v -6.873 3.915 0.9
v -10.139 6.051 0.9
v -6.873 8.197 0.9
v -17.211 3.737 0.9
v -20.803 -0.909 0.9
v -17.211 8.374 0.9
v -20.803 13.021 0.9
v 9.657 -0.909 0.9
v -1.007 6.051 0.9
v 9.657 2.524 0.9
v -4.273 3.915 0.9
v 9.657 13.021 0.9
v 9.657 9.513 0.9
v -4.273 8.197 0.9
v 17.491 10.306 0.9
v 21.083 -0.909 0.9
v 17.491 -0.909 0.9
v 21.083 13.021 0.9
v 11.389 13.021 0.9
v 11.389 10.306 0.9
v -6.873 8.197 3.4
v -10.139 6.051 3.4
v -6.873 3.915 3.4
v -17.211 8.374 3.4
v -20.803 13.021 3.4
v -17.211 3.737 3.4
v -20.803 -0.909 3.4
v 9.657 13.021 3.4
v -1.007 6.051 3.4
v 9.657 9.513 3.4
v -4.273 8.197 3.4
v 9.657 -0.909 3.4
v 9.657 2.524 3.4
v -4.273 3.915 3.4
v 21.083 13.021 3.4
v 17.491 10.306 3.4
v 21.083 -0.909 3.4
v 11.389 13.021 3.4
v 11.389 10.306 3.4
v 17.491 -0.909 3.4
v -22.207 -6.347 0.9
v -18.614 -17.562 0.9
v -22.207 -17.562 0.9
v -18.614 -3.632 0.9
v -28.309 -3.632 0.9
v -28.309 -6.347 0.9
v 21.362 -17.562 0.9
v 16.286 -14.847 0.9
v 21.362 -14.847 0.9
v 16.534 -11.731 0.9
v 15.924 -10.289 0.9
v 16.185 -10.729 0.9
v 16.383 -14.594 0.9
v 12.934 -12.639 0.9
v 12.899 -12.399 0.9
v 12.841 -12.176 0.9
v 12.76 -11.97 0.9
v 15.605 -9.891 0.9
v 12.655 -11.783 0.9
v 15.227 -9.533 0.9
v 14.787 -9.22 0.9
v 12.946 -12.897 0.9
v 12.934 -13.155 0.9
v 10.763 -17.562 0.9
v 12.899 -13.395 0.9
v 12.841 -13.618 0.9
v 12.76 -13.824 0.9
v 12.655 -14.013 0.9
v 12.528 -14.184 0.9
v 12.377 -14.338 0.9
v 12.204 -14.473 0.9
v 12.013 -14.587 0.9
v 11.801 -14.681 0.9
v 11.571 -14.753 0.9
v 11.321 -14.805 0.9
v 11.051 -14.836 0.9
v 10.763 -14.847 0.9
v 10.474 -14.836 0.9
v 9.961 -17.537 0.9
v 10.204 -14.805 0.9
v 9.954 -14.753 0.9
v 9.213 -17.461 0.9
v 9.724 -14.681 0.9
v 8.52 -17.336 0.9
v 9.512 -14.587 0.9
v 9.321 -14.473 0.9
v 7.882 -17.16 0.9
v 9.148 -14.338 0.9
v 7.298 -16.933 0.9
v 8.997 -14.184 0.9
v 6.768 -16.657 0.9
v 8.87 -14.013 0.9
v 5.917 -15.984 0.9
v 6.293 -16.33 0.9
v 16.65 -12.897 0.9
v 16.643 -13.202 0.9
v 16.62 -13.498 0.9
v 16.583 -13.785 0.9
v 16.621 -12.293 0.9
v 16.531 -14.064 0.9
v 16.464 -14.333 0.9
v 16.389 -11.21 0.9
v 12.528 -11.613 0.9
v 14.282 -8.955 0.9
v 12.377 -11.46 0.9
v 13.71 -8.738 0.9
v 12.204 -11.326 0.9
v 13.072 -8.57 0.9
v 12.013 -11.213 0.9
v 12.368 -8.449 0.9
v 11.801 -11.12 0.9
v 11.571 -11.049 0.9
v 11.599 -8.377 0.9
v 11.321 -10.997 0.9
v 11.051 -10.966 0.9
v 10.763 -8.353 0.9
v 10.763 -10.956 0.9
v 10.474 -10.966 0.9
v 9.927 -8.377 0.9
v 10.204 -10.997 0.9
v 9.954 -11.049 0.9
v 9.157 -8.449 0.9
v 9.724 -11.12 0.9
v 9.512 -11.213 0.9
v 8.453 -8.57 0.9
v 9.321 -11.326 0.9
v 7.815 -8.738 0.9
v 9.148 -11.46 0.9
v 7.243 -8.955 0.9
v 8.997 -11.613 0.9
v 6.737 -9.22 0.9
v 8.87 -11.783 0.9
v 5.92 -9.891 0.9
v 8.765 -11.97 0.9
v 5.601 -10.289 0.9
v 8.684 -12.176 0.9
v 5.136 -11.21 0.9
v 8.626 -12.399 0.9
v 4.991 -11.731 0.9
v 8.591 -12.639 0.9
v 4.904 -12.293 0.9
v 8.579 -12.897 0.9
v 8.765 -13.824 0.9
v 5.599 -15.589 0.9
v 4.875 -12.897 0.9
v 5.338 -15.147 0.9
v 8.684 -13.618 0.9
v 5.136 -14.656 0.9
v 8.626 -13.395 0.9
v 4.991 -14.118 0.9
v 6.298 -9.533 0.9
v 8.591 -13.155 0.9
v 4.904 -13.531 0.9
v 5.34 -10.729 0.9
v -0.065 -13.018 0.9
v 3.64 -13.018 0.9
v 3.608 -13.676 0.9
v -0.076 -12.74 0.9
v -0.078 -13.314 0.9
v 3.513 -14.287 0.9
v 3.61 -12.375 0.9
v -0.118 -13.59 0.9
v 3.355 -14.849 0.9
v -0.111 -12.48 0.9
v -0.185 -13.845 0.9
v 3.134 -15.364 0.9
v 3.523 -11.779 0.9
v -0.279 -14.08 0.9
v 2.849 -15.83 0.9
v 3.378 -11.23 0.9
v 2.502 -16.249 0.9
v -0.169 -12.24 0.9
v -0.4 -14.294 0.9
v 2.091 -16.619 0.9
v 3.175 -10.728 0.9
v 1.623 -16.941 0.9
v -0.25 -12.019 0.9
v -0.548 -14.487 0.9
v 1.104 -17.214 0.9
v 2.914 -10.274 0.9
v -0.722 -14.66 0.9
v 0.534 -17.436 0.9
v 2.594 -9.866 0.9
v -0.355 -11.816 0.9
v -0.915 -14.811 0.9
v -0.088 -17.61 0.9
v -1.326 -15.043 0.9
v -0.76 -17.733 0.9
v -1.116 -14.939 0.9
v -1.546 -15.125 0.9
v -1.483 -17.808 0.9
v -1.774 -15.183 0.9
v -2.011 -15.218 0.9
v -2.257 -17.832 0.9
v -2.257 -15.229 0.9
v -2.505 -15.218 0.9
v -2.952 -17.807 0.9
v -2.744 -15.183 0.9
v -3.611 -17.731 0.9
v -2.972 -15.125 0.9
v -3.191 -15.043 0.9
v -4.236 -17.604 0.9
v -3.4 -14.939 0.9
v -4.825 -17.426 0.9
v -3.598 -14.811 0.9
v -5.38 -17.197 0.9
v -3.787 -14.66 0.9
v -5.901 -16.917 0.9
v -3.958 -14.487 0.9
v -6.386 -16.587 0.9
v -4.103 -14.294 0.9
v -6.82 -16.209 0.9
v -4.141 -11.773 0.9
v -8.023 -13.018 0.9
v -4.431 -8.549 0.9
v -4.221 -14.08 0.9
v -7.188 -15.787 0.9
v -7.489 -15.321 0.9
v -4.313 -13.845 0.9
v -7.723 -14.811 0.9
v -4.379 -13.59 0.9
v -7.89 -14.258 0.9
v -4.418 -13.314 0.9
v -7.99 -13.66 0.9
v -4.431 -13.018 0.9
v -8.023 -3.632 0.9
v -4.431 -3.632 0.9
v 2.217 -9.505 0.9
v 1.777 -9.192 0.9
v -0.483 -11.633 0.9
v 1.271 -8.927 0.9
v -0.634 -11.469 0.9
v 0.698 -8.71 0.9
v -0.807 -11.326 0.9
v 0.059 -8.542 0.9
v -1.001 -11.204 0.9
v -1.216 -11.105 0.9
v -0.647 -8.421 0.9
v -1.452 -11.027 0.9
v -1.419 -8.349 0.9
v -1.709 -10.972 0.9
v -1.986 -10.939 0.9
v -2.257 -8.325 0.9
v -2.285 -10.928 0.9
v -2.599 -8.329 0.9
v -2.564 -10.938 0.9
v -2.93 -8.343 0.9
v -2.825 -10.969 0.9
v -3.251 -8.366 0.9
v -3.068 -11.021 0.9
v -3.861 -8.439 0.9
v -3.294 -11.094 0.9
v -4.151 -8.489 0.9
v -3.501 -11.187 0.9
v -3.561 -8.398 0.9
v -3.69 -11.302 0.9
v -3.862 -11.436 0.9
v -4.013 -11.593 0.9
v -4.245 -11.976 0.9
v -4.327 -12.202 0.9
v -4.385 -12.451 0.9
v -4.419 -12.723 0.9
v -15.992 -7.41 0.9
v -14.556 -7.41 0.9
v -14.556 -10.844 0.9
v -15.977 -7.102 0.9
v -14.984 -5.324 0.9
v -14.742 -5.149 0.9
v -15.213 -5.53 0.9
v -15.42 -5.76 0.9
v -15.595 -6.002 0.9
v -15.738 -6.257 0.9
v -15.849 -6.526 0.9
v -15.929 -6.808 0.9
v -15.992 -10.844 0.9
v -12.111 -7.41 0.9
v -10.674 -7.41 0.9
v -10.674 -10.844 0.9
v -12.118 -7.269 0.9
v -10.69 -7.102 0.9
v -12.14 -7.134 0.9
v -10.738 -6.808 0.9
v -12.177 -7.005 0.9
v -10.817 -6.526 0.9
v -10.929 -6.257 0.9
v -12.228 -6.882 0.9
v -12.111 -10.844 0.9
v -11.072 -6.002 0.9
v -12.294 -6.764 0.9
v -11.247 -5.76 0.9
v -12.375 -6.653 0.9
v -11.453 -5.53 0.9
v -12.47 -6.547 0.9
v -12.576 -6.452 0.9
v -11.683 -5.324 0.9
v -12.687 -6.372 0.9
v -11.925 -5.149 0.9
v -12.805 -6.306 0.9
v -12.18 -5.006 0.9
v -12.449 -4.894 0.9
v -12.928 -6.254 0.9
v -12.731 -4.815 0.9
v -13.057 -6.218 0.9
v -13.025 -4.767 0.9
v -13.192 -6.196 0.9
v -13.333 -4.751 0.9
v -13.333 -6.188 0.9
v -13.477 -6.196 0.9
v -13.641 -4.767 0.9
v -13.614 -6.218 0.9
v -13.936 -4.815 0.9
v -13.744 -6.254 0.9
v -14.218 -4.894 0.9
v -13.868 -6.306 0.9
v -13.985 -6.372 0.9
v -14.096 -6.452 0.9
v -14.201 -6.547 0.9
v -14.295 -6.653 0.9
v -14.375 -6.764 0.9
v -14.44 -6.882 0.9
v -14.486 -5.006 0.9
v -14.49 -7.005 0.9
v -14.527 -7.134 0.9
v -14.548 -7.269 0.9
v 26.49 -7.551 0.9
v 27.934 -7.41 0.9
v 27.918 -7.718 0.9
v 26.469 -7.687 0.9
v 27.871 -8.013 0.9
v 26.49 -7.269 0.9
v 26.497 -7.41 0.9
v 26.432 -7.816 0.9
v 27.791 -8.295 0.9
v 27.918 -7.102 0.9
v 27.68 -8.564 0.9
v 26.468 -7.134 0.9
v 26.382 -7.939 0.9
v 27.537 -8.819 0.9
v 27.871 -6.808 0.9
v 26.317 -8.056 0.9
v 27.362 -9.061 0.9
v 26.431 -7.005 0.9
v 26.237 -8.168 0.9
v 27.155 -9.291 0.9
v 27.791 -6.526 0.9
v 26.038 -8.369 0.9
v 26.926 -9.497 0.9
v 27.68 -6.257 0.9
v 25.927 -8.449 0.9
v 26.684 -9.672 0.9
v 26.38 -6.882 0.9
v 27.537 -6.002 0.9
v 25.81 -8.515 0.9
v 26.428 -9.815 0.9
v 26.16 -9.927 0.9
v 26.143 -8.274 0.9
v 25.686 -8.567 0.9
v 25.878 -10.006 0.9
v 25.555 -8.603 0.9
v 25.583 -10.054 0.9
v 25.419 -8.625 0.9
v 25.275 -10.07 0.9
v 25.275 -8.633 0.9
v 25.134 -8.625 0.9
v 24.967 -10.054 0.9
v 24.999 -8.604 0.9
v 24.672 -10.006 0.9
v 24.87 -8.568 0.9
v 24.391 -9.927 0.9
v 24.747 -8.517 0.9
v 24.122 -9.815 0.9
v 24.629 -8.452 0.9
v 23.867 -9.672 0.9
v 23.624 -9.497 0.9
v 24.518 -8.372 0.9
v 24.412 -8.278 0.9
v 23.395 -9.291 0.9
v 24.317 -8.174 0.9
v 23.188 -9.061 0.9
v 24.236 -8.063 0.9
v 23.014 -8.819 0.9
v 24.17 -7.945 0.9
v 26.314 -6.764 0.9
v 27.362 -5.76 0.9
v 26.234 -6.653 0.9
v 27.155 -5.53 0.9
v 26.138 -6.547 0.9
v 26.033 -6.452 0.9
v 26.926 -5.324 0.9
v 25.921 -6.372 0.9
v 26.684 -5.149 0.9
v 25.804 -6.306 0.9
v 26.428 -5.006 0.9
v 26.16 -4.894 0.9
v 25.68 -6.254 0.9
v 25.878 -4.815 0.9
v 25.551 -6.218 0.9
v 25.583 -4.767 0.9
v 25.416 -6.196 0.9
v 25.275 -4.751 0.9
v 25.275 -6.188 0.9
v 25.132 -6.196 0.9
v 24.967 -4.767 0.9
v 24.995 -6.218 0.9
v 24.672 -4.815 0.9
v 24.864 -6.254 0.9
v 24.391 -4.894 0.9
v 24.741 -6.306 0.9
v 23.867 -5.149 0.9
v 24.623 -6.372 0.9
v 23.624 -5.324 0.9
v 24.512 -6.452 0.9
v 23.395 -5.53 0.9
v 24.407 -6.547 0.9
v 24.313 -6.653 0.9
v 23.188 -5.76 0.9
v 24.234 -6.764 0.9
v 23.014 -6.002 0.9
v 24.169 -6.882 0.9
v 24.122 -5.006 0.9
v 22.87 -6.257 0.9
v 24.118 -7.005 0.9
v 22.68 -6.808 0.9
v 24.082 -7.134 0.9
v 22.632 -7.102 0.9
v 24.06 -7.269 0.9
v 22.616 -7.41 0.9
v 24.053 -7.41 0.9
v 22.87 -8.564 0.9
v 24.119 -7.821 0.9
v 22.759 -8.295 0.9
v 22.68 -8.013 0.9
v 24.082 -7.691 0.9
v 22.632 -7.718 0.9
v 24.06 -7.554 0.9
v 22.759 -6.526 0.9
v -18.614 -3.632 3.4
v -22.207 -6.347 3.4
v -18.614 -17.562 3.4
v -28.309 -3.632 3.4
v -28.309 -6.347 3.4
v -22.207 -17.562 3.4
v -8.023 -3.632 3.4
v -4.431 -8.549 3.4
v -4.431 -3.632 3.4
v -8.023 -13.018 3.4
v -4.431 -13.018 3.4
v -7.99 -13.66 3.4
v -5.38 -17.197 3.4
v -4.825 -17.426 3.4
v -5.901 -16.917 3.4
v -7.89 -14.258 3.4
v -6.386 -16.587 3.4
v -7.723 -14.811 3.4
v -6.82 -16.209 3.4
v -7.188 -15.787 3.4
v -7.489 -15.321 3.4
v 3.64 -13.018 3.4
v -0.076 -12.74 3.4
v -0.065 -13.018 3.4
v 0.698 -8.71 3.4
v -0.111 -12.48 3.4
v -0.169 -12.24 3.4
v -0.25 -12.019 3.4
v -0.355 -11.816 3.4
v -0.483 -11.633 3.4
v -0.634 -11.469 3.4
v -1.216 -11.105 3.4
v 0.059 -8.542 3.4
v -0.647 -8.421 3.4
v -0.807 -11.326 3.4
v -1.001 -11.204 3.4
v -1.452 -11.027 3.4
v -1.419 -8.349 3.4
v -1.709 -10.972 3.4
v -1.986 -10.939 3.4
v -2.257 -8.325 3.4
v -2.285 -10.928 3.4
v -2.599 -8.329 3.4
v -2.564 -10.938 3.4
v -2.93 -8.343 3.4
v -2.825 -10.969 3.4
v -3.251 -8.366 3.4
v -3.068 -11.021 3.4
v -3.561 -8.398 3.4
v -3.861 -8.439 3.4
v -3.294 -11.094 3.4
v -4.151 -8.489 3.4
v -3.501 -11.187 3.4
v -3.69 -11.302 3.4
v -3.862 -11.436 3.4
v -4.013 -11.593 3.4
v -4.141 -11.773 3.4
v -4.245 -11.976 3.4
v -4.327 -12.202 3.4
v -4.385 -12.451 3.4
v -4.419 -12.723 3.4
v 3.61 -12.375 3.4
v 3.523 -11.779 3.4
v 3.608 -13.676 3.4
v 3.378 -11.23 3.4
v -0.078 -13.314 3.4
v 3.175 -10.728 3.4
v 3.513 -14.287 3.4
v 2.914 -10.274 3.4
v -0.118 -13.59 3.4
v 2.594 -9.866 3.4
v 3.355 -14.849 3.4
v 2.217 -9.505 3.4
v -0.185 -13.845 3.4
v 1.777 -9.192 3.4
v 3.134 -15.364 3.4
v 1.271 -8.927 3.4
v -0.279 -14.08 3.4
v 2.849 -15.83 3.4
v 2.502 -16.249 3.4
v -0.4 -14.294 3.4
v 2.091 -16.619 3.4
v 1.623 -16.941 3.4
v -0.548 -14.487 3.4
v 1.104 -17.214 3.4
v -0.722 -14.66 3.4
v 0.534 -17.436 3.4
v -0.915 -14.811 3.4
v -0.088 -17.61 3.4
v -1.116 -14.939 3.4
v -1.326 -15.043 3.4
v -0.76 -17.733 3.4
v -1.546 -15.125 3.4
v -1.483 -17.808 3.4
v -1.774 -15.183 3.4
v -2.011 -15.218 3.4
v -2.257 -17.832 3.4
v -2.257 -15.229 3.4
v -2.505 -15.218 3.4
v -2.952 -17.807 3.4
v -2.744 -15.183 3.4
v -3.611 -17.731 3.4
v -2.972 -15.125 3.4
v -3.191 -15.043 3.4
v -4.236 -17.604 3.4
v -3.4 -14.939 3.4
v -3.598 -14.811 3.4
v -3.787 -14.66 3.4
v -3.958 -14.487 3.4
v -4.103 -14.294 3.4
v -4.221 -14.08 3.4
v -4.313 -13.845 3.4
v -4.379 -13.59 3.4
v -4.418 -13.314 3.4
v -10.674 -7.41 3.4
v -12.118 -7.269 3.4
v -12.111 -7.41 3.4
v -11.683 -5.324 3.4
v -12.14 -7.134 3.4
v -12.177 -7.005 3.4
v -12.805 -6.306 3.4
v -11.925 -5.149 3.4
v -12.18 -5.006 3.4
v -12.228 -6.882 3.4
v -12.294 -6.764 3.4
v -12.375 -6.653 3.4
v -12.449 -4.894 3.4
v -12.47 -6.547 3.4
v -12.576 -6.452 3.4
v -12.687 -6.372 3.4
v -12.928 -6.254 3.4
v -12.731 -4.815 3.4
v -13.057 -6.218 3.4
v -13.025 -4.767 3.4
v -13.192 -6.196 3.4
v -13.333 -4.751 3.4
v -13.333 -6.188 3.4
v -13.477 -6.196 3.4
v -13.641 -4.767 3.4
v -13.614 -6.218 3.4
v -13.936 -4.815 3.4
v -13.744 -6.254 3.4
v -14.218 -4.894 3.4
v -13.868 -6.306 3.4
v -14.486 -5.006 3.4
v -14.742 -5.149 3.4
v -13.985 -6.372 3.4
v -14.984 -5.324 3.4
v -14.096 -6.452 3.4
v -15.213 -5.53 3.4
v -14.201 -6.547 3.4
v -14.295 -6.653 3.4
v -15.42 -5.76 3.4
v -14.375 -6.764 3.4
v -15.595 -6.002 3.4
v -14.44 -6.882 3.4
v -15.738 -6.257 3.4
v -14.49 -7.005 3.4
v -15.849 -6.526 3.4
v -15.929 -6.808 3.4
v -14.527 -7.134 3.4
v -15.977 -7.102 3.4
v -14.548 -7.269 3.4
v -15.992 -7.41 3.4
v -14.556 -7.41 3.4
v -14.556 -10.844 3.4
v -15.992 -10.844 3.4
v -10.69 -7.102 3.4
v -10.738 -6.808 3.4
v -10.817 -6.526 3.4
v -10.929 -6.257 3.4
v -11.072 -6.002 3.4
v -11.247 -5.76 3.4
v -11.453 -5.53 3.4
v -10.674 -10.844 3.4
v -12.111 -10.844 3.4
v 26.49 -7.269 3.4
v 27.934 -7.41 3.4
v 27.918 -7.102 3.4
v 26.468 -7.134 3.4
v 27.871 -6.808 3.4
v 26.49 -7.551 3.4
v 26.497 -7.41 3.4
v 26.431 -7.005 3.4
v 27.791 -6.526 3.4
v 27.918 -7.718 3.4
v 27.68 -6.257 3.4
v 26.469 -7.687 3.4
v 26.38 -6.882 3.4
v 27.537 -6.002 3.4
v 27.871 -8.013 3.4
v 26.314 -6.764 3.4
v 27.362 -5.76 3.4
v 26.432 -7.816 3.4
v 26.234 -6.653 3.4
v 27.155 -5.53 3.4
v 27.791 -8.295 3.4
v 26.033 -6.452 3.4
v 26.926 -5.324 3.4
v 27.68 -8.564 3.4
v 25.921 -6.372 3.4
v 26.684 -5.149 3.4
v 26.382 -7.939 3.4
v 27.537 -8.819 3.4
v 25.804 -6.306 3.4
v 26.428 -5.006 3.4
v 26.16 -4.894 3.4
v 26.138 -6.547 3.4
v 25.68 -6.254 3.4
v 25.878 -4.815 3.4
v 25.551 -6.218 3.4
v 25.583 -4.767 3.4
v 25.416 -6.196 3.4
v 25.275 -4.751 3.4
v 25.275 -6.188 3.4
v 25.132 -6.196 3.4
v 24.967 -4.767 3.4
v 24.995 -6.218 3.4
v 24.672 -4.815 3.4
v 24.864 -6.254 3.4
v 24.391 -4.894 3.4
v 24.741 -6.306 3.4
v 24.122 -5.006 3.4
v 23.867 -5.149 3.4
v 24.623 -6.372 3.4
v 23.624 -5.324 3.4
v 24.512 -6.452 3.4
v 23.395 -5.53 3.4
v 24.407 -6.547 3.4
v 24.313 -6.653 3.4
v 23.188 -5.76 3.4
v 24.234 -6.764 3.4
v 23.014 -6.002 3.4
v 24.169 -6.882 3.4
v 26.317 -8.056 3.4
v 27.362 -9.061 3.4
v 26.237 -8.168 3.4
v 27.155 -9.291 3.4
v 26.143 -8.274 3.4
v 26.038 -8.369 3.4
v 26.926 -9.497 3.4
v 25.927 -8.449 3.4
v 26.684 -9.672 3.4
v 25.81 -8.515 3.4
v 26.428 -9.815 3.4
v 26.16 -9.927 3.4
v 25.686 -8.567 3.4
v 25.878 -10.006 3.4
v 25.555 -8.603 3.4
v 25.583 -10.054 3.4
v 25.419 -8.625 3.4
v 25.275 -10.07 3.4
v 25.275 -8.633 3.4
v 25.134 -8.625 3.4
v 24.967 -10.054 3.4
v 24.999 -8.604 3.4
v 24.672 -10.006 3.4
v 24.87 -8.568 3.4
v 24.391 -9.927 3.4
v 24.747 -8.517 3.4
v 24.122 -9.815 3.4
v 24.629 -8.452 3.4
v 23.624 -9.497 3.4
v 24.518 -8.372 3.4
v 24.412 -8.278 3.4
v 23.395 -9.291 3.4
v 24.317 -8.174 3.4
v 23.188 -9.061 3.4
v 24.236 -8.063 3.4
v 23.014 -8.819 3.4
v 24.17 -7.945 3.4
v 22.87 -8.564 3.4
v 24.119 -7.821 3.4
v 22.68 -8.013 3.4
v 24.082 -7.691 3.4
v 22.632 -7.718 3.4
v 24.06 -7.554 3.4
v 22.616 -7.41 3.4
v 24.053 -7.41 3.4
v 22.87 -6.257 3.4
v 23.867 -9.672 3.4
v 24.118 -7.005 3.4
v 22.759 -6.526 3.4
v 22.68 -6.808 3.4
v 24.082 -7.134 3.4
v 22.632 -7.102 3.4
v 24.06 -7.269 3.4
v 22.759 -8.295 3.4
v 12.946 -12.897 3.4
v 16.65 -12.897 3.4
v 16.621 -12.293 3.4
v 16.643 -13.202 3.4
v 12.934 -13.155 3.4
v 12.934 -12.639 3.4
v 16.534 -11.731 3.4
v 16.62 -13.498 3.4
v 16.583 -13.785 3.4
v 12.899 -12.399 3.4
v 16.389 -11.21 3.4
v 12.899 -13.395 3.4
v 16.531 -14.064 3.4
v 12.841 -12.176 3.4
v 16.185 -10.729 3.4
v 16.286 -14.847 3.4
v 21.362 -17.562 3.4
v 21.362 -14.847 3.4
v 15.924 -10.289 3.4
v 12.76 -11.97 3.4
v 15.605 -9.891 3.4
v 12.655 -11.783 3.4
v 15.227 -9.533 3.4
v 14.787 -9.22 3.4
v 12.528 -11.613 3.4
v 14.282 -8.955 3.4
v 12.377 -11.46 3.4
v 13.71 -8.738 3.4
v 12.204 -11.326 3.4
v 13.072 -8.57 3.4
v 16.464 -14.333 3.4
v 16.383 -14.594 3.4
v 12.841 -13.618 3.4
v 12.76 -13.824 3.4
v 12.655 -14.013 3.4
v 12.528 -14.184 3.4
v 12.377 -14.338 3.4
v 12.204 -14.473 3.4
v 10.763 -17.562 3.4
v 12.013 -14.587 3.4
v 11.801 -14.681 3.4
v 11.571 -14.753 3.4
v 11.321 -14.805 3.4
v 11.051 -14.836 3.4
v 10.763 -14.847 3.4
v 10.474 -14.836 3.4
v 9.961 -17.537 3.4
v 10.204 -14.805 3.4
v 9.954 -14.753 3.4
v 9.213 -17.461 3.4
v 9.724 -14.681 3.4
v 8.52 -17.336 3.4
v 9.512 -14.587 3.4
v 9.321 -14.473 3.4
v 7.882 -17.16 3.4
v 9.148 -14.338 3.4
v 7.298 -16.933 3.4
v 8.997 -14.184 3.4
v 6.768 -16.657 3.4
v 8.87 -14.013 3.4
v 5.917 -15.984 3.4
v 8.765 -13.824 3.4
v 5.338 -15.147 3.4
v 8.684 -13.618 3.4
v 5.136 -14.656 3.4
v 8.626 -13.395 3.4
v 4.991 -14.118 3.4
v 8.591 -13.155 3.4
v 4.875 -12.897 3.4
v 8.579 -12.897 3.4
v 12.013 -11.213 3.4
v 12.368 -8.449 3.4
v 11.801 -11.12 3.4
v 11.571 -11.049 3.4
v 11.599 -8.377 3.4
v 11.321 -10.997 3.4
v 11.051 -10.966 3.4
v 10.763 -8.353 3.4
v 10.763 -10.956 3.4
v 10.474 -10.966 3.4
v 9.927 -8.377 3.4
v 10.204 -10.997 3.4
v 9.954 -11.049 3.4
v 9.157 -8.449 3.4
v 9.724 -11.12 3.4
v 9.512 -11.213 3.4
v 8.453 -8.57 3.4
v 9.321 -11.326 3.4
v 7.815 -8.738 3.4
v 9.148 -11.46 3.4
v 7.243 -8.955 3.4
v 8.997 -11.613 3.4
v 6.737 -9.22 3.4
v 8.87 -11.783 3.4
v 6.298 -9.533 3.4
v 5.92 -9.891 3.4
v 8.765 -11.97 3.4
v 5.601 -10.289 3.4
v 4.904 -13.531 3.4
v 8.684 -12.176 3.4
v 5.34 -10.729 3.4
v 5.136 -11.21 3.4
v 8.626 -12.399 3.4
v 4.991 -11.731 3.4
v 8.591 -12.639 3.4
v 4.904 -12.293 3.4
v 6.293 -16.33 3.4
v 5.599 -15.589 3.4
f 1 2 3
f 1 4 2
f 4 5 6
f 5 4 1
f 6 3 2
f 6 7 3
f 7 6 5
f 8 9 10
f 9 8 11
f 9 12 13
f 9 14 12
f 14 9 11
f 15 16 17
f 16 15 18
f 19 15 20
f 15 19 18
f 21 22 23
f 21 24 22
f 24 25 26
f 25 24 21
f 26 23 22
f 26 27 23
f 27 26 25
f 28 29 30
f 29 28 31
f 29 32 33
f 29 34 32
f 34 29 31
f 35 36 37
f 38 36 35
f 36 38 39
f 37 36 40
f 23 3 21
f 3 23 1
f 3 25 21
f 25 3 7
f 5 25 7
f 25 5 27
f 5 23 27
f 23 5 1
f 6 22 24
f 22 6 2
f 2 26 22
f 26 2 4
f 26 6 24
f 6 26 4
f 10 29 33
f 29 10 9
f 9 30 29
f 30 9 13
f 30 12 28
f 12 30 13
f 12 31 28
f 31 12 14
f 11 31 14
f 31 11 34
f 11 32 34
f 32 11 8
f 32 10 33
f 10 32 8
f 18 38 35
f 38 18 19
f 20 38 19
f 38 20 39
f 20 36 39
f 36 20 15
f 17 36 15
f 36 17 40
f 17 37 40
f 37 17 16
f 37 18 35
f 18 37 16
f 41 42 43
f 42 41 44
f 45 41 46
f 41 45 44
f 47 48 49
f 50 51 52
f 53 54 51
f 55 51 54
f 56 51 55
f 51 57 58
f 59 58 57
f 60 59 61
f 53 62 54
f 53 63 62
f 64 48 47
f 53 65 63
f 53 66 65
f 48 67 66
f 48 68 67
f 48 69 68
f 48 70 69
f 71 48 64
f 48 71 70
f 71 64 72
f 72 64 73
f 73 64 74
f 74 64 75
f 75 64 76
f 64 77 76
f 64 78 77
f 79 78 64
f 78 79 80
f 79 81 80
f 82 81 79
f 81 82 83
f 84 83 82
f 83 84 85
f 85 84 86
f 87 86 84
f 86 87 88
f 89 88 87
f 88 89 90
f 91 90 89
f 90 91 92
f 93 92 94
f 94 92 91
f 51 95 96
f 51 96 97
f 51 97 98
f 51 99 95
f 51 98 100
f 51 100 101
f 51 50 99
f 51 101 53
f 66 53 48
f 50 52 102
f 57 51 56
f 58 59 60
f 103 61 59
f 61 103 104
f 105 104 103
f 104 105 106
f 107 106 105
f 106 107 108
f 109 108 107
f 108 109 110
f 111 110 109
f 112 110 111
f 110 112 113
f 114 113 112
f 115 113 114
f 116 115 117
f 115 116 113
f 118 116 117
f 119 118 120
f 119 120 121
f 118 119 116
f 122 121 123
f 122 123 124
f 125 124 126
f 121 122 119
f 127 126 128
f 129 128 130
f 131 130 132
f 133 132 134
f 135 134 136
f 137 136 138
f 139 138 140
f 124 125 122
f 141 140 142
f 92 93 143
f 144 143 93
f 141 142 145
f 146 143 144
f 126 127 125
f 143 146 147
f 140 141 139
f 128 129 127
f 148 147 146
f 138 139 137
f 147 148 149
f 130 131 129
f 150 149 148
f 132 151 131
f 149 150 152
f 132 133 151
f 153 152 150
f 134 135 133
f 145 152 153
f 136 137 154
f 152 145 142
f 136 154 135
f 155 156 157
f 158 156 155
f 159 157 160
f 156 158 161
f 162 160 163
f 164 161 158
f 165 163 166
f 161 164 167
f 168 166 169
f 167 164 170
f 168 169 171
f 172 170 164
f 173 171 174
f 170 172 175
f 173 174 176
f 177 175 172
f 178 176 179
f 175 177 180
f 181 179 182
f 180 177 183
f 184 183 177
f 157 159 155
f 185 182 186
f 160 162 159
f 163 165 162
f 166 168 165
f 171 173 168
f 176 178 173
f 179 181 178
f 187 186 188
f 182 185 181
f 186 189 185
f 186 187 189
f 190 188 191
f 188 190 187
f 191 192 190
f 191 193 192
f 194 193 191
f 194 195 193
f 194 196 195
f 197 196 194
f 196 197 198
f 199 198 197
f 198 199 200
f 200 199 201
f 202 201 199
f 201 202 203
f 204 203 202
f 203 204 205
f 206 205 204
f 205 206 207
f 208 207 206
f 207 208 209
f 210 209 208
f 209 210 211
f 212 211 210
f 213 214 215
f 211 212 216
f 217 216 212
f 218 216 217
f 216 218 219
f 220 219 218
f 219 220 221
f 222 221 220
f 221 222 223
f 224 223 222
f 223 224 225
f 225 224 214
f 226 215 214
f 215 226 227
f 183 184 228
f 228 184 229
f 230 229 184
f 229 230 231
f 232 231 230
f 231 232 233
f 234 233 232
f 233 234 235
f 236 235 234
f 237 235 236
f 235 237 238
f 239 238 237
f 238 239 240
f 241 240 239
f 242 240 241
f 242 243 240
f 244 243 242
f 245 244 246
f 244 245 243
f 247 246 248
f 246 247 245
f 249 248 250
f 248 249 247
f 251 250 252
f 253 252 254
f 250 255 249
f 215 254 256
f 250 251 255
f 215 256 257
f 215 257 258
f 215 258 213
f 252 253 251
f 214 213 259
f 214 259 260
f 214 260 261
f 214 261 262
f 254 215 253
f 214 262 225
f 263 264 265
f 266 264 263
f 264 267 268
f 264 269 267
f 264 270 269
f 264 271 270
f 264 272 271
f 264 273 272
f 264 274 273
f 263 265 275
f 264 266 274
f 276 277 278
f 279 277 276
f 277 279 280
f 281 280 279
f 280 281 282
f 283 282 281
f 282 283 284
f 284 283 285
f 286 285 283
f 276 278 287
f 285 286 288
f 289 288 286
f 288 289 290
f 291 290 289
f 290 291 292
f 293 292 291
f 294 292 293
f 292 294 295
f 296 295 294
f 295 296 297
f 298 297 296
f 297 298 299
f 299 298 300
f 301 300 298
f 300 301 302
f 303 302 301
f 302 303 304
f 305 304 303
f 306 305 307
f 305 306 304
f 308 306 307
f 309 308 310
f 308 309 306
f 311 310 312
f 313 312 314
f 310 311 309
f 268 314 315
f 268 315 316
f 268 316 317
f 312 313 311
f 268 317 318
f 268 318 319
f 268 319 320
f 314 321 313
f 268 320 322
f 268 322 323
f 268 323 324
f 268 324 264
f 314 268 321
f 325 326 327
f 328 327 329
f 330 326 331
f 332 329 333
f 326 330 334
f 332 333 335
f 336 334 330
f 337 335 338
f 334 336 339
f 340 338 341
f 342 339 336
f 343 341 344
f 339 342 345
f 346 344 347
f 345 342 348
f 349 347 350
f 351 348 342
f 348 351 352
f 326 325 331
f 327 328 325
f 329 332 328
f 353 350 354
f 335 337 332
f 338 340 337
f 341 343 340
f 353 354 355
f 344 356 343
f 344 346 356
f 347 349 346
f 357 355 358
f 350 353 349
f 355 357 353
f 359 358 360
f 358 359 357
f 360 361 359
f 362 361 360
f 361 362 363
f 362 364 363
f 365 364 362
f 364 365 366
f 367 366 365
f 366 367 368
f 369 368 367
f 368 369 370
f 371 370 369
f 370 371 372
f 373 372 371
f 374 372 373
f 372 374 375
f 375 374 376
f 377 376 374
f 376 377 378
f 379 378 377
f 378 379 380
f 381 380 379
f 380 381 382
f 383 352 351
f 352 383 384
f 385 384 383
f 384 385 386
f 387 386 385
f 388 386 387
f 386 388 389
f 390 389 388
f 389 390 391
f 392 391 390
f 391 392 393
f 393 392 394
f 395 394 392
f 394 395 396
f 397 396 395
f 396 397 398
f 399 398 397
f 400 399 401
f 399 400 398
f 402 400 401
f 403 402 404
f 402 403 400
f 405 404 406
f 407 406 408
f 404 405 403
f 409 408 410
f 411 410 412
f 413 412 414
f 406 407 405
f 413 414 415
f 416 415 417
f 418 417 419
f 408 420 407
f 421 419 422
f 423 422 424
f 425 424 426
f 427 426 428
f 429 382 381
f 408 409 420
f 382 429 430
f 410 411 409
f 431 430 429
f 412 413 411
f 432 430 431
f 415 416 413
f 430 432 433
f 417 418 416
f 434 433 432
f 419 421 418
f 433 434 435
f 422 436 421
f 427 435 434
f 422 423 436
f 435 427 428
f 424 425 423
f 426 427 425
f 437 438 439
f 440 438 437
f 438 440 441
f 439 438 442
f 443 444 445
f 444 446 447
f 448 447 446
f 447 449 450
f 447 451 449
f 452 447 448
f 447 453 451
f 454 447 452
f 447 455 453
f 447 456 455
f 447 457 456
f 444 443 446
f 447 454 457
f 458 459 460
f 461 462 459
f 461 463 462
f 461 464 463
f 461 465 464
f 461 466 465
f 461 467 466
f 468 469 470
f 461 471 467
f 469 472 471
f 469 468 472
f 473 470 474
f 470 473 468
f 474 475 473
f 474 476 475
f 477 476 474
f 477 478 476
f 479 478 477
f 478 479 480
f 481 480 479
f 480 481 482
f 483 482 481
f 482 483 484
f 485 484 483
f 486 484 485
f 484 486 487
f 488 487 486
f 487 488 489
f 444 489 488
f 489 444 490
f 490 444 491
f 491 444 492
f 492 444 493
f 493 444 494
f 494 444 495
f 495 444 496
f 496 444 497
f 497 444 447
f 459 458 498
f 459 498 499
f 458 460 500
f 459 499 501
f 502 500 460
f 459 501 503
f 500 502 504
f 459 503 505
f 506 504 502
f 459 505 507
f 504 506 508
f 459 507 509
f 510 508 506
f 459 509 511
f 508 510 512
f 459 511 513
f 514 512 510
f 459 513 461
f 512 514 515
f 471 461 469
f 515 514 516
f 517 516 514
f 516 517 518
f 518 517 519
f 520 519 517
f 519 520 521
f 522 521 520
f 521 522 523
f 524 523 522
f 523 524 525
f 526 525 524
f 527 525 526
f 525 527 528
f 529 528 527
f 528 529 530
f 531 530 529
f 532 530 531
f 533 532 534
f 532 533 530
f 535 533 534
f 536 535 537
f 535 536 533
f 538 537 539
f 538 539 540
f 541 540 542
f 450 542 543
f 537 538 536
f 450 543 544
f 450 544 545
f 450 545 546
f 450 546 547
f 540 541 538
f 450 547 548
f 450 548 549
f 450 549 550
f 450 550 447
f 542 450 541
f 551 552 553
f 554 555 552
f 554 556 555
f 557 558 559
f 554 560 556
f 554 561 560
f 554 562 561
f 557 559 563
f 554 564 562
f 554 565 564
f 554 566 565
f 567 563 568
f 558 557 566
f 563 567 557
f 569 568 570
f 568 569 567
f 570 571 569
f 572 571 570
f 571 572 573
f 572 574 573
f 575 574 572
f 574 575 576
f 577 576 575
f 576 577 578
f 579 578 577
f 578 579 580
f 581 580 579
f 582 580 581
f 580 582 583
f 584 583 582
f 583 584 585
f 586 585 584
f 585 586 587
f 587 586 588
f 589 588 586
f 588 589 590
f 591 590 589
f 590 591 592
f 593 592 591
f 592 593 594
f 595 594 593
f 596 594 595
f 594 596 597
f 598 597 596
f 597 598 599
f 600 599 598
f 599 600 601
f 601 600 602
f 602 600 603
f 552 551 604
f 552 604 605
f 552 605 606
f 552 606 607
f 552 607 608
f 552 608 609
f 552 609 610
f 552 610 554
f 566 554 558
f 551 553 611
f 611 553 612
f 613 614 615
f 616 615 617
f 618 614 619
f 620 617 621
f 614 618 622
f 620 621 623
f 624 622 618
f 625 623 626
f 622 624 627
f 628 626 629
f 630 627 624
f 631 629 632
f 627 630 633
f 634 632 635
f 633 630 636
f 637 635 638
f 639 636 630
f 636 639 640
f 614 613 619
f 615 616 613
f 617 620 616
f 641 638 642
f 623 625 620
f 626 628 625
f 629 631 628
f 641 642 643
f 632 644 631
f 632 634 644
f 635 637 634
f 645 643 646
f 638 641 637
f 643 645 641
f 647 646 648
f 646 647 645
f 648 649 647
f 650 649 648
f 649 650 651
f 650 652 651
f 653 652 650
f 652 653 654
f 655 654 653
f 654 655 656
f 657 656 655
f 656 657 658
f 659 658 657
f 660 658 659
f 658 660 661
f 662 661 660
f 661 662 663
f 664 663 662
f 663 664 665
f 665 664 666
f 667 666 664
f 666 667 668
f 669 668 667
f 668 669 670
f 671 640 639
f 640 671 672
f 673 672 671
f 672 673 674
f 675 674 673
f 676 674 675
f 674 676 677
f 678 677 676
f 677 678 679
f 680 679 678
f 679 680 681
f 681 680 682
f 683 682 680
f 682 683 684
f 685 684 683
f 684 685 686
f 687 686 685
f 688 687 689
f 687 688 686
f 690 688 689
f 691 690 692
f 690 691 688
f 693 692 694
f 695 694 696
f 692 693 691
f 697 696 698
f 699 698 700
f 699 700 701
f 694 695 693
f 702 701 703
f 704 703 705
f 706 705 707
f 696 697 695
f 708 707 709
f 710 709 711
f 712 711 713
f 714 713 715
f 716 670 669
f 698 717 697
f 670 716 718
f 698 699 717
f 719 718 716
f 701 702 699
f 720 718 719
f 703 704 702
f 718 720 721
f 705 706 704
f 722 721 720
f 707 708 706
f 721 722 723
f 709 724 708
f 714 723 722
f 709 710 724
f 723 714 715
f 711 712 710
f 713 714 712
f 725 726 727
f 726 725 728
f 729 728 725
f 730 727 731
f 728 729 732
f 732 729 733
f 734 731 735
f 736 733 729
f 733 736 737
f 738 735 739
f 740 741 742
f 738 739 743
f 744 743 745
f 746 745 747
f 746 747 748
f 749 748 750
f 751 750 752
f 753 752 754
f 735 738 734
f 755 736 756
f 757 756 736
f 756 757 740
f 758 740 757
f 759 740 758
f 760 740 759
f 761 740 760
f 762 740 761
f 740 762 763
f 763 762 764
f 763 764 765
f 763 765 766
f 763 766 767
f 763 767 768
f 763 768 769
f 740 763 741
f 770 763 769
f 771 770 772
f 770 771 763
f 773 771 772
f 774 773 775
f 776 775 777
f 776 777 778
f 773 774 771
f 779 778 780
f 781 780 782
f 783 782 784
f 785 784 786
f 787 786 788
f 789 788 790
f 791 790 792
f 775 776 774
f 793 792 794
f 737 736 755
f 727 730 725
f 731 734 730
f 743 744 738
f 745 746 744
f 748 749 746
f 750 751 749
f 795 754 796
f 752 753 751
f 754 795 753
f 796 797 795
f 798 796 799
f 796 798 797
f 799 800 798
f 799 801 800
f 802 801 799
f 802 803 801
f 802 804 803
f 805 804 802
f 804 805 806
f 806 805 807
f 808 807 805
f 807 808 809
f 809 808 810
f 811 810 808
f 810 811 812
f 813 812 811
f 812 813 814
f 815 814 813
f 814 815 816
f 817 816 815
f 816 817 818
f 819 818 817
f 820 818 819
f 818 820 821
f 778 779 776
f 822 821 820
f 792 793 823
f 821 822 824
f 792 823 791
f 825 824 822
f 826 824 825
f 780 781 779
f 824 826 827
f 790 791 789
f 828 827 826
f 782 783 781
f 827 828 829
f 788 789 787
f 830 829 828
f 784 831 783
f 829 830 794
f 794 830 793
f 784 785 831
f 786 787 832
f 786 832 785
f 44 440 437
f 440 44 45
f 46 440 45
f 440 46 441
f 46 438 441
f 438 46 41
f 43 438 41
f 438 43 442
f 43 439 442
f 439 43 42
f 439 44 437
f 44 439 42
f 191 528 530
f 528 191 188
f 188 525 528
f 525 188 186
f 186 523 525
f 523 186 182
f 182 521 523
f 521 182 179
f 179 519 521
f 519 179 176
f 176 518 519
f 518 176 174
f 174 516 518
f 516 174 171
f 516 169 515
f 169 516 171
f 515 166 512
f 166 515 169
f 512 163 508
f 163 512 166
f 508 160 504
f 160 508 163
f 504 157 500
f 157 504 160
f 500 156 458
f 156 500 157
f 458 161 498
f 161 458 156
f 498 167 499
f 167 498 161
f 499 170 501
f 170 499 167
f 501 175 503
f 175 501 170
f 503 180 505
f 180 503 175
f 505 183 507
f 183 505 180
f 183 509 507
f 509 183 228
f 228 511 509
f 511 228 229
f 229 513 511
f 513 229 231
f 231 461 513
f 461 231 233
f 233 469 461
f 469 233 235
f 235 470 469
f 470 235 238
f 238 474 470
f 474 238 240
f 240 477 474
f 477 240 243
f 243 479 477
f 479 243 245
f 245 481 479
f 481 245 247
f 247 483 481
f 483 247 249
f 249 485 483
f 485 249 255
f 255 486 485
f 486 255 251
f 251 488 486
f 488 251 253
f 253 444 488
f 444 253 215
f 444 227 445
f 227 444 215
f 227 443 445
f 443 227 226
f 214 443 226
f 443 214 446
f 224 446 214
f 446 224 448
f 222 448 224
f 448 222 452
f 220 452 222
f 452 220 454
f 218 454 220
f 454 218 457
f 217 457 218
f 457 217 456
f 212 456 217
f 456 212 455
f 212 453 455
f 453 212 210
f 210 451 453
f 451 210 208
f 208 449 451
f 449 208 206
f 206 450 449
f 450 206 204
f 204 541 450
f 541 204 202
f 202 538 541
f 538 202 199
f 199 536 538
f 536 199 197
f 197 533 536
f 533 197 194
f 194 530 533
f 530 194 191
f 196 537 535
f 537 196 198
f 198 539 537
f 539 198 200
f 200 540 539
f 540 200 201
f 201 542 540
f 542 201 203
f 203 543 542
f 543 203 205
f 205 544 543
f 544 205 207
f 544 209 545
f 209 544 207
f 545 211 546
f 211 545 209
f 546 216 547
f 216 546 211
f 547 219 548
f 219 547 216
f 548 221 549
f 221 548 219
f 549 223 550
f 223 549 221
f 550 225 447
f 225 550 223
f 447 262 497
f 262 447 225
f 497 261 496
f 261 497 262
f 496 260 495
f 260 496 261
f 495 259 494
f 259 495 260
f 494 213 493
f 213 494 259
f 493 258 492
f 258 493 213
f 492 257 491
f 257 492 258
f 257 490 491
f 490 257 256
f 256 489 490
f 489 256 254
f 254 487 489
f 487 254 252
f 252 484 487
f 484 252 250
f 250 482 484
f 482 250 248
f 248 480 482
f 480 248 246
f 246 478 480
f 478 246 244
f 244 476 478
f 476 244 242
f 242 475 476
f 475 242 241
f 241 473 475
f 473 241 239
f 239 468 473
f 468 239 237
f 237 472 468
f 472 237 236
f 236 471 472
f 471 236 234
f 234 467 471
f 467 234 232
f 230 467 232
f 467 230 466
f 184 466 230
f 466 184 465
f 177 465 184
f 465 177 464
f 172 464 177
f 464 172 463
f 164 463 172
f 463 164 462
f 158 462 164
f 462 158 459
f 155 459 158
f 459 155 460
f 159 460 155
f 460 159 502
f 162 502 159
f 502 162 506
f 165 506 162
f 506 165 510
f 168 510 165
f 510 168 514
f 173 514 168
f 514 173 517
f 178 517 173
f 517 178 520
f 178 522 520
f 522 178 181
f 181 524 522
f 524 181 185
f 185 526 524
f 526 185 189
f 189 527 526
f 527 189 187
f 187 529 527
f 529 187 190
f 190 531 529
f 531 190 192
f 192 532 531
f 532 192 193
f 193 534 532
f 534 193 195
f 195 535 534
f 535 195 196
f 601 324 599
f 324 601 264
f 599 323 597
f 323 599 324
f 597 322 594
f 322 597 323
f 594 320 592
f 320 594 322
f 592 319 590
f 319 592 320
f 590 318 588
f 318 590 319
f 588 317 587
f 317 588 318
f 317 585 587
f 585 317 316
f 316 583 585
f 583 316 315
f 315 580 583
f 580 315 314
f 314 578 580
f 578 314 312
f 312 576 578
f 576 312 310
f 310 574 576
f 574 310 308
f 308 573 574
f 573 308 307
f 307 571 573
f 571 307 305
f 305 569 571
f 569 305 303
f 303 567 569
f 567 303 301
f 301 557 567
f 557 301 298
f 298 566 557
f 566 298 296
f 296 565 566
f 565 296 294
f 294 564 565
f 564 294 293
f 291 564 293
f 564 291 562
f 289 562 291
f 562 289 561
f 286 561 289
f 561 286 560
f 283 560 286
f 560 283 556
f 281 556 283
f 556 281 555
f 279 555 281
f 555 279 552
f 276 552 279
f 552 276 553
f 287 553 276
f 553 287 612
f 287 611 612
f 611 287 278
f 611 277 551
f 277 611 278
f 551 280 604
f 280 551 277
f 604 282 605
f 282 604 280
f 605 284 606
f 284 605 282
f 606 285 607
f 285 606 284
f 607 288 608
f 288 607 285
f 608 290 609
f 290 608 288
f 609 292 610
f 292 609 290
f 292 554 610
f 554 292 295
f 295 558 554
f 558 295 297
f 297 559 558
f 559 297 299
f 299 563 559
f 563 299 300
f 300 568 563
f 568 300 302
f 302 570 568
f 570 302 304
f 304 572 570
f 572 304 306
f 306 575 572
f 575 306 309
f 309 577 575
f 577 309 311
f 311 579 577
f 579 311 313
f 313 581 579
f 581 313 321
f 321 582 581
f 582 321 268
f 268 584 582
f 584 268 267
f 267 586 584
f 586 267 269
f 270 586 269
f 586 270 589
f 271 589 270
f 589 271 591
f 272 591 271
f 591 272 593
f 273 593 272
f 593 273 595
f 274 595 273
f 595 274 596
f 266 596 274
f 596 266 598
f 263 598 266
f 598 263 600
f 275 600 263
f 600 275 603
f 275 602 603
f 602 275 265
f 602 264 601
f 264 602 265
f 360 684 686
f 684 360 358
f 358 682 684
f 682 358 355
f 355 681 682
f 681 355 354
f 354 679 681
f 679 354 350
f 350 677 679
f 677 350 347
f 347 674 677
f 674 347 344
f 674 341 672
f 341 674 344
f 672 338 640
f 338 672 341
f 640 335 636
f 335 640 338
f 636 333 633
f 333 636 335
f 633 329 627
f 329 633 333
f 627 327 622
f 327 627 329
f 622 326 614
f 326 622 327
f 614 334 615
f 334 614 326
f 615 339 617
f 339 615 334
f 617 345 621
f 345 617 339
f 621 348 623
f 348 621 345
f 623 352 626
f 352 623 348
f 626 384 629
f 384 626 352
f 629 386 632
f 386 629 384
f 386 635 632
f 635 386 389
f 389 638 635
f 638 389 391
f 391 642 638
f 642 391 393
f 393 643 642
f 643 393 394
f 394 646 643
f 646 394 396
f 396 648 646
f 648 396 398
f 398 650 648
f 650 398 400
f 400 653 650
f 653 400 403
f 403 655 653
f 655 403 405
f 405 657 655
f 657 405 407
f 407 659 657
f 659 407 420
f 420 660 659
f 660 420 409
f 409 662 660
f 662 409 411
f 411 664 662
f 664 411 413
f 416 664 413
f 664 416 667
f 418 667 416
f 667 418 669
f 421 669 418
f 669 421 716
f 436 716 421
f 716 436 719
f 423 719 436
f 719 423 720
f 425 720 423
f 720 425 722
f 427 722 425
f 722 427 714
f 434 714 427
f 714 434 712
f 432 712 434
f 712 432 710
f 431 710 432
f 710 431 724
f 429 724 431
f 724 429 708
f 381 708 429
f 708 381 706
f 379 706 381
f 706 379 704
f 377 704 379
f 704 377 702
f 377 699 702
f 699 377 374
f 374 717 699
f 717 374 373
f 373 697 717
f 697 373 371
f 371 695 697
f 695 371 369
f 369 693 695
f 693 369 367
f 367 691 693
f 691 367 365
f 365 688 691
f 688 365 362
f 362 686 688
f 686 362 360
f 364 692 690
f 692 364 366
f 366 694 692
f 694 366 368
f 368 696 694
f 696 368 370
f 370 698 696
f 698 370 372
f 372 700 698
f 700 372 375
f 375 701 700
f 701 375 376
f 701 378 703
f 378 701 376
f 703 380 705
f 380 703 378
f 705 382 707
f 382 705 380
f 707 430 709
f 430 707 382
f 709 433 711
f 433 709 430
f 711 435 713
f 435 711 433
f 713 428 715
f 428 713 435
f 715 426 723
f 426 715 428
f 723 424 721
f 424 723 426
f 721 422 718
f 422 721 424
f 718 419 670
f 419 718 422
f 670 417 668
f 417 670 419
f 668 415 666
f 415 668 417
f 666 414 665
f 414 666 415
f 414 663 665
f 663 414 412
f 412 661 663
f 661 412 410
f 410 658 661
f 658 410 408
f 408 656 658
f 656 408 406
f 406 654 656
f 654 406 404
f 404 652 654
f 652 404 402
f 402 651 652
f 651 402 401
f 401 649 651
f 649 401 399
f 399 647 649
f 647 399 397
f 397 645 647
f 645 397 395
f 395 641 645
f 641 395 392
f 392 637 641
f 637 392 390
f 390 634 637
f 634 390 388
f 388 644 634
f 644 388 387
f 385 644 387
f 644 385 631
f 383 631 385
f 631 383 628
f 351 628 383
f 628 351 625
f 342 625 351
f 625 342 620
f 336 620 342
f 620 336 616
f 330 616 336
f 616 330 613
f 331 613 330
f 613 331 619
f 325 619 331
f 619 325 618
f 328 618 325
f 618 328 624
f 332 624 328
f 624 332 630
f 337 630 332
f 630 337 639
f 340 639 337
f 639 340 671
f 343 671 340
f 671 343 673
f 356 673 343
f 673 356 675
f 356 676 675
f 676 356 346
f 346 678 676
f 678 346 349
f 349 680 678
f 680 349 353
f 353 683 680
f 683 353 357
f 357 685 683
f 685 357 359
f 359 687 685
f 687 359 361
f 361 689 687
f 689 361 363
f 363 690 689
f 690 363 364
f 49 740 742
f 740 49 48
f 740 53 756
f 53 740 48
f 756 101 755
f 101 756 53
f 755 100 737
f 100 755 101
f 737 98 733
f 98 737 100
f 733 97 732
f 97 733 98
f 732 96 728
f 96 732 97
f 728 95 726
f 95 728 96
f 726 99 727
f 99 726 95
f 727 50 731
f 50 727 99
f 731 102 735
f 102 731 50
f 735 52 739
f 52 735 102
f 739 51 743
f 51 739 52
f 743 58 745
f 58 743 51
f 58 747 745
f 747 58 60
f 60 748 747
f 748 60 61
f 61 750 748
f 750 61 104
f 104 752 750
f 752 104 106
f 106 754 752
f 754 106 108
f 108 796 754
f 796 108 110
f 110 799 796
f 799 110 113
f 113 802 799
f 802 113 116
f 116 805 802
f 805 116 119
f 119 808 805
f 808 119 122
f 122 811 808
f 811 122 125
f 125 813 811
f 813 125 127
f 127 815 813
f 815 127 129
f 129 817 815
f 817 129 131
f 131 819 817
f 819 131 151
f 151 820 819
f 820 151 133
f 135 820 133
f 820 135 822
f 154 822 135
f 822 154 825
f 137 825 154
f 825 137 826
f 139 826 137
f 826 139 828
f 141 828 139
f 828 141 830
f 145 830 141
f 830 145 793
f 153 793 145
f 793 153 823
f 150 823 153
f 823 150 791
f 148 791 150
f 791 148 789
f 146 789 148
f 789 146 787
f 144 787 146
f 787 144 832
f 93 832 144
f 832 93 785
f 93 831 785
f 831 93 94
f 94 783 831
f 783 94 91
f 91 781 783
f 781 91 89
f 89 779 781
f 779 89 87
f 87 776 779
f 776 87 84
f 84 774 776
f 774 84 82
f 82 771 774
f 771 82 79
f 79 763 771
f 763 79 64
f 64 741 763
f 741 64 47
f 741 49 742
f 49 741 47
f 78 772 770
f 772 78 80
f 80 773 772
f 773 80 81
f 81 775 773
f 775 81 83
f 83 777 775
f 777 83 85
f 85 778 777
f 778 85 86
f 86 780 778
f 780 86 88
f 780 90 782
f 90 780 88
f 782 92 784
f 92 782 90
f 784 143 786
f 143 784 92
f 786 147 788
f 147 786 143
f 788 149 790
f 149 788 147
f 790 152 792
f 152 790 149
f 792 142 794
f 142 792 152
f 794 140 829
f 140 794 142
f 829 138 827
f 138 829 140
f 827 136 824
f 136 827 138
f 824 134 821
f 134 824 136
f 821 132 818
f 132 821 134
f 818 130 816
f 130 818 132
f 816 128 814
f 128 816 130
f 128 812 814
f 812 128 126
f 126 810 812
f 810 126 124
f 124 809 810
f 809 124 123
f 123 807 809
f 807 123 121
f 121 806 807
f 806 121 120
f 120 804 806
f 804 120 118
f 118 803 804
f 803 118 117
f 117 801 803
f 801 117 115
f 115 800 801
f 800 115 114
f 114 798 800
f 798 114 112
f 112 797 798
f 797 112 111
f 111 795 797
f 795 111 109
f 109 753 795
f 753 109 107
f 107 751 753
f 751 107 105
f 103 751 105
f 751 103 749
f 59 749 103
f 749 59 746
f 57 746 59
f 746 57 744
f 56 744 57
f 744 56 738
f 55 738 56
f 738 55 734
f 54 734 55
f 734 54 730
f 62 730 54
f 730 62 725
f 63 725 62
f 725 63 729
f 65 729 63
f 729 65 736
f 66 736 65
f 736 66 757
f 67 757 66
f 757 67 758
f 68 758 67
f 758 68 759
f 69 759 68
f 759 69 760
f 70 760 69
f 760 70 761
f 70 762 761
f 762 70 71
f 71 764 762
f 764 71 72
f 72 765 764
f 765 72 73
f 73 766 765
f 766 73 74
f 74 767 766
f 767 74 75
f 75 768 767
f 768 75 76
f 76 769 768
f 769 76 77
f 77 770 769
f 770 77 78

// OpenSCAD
$fn = 48;
  // syllabics (overlaid on icon, tallest)
  translate([0, 5.893, 0.900]) linear_extrude(height=2.500) text("ᐅᐸᒣ", size=13.759, halign="center", valign="center", font="Euphemia UCAS:style=Bold");
  translate([0, -10.893, 0.900]) linear_extrude(height=2.500) text("ᒣᐢᑲᓇᐤ", size=13.759, halign="center", valign="center", font="Euphemia UCAS:style=Bold");
